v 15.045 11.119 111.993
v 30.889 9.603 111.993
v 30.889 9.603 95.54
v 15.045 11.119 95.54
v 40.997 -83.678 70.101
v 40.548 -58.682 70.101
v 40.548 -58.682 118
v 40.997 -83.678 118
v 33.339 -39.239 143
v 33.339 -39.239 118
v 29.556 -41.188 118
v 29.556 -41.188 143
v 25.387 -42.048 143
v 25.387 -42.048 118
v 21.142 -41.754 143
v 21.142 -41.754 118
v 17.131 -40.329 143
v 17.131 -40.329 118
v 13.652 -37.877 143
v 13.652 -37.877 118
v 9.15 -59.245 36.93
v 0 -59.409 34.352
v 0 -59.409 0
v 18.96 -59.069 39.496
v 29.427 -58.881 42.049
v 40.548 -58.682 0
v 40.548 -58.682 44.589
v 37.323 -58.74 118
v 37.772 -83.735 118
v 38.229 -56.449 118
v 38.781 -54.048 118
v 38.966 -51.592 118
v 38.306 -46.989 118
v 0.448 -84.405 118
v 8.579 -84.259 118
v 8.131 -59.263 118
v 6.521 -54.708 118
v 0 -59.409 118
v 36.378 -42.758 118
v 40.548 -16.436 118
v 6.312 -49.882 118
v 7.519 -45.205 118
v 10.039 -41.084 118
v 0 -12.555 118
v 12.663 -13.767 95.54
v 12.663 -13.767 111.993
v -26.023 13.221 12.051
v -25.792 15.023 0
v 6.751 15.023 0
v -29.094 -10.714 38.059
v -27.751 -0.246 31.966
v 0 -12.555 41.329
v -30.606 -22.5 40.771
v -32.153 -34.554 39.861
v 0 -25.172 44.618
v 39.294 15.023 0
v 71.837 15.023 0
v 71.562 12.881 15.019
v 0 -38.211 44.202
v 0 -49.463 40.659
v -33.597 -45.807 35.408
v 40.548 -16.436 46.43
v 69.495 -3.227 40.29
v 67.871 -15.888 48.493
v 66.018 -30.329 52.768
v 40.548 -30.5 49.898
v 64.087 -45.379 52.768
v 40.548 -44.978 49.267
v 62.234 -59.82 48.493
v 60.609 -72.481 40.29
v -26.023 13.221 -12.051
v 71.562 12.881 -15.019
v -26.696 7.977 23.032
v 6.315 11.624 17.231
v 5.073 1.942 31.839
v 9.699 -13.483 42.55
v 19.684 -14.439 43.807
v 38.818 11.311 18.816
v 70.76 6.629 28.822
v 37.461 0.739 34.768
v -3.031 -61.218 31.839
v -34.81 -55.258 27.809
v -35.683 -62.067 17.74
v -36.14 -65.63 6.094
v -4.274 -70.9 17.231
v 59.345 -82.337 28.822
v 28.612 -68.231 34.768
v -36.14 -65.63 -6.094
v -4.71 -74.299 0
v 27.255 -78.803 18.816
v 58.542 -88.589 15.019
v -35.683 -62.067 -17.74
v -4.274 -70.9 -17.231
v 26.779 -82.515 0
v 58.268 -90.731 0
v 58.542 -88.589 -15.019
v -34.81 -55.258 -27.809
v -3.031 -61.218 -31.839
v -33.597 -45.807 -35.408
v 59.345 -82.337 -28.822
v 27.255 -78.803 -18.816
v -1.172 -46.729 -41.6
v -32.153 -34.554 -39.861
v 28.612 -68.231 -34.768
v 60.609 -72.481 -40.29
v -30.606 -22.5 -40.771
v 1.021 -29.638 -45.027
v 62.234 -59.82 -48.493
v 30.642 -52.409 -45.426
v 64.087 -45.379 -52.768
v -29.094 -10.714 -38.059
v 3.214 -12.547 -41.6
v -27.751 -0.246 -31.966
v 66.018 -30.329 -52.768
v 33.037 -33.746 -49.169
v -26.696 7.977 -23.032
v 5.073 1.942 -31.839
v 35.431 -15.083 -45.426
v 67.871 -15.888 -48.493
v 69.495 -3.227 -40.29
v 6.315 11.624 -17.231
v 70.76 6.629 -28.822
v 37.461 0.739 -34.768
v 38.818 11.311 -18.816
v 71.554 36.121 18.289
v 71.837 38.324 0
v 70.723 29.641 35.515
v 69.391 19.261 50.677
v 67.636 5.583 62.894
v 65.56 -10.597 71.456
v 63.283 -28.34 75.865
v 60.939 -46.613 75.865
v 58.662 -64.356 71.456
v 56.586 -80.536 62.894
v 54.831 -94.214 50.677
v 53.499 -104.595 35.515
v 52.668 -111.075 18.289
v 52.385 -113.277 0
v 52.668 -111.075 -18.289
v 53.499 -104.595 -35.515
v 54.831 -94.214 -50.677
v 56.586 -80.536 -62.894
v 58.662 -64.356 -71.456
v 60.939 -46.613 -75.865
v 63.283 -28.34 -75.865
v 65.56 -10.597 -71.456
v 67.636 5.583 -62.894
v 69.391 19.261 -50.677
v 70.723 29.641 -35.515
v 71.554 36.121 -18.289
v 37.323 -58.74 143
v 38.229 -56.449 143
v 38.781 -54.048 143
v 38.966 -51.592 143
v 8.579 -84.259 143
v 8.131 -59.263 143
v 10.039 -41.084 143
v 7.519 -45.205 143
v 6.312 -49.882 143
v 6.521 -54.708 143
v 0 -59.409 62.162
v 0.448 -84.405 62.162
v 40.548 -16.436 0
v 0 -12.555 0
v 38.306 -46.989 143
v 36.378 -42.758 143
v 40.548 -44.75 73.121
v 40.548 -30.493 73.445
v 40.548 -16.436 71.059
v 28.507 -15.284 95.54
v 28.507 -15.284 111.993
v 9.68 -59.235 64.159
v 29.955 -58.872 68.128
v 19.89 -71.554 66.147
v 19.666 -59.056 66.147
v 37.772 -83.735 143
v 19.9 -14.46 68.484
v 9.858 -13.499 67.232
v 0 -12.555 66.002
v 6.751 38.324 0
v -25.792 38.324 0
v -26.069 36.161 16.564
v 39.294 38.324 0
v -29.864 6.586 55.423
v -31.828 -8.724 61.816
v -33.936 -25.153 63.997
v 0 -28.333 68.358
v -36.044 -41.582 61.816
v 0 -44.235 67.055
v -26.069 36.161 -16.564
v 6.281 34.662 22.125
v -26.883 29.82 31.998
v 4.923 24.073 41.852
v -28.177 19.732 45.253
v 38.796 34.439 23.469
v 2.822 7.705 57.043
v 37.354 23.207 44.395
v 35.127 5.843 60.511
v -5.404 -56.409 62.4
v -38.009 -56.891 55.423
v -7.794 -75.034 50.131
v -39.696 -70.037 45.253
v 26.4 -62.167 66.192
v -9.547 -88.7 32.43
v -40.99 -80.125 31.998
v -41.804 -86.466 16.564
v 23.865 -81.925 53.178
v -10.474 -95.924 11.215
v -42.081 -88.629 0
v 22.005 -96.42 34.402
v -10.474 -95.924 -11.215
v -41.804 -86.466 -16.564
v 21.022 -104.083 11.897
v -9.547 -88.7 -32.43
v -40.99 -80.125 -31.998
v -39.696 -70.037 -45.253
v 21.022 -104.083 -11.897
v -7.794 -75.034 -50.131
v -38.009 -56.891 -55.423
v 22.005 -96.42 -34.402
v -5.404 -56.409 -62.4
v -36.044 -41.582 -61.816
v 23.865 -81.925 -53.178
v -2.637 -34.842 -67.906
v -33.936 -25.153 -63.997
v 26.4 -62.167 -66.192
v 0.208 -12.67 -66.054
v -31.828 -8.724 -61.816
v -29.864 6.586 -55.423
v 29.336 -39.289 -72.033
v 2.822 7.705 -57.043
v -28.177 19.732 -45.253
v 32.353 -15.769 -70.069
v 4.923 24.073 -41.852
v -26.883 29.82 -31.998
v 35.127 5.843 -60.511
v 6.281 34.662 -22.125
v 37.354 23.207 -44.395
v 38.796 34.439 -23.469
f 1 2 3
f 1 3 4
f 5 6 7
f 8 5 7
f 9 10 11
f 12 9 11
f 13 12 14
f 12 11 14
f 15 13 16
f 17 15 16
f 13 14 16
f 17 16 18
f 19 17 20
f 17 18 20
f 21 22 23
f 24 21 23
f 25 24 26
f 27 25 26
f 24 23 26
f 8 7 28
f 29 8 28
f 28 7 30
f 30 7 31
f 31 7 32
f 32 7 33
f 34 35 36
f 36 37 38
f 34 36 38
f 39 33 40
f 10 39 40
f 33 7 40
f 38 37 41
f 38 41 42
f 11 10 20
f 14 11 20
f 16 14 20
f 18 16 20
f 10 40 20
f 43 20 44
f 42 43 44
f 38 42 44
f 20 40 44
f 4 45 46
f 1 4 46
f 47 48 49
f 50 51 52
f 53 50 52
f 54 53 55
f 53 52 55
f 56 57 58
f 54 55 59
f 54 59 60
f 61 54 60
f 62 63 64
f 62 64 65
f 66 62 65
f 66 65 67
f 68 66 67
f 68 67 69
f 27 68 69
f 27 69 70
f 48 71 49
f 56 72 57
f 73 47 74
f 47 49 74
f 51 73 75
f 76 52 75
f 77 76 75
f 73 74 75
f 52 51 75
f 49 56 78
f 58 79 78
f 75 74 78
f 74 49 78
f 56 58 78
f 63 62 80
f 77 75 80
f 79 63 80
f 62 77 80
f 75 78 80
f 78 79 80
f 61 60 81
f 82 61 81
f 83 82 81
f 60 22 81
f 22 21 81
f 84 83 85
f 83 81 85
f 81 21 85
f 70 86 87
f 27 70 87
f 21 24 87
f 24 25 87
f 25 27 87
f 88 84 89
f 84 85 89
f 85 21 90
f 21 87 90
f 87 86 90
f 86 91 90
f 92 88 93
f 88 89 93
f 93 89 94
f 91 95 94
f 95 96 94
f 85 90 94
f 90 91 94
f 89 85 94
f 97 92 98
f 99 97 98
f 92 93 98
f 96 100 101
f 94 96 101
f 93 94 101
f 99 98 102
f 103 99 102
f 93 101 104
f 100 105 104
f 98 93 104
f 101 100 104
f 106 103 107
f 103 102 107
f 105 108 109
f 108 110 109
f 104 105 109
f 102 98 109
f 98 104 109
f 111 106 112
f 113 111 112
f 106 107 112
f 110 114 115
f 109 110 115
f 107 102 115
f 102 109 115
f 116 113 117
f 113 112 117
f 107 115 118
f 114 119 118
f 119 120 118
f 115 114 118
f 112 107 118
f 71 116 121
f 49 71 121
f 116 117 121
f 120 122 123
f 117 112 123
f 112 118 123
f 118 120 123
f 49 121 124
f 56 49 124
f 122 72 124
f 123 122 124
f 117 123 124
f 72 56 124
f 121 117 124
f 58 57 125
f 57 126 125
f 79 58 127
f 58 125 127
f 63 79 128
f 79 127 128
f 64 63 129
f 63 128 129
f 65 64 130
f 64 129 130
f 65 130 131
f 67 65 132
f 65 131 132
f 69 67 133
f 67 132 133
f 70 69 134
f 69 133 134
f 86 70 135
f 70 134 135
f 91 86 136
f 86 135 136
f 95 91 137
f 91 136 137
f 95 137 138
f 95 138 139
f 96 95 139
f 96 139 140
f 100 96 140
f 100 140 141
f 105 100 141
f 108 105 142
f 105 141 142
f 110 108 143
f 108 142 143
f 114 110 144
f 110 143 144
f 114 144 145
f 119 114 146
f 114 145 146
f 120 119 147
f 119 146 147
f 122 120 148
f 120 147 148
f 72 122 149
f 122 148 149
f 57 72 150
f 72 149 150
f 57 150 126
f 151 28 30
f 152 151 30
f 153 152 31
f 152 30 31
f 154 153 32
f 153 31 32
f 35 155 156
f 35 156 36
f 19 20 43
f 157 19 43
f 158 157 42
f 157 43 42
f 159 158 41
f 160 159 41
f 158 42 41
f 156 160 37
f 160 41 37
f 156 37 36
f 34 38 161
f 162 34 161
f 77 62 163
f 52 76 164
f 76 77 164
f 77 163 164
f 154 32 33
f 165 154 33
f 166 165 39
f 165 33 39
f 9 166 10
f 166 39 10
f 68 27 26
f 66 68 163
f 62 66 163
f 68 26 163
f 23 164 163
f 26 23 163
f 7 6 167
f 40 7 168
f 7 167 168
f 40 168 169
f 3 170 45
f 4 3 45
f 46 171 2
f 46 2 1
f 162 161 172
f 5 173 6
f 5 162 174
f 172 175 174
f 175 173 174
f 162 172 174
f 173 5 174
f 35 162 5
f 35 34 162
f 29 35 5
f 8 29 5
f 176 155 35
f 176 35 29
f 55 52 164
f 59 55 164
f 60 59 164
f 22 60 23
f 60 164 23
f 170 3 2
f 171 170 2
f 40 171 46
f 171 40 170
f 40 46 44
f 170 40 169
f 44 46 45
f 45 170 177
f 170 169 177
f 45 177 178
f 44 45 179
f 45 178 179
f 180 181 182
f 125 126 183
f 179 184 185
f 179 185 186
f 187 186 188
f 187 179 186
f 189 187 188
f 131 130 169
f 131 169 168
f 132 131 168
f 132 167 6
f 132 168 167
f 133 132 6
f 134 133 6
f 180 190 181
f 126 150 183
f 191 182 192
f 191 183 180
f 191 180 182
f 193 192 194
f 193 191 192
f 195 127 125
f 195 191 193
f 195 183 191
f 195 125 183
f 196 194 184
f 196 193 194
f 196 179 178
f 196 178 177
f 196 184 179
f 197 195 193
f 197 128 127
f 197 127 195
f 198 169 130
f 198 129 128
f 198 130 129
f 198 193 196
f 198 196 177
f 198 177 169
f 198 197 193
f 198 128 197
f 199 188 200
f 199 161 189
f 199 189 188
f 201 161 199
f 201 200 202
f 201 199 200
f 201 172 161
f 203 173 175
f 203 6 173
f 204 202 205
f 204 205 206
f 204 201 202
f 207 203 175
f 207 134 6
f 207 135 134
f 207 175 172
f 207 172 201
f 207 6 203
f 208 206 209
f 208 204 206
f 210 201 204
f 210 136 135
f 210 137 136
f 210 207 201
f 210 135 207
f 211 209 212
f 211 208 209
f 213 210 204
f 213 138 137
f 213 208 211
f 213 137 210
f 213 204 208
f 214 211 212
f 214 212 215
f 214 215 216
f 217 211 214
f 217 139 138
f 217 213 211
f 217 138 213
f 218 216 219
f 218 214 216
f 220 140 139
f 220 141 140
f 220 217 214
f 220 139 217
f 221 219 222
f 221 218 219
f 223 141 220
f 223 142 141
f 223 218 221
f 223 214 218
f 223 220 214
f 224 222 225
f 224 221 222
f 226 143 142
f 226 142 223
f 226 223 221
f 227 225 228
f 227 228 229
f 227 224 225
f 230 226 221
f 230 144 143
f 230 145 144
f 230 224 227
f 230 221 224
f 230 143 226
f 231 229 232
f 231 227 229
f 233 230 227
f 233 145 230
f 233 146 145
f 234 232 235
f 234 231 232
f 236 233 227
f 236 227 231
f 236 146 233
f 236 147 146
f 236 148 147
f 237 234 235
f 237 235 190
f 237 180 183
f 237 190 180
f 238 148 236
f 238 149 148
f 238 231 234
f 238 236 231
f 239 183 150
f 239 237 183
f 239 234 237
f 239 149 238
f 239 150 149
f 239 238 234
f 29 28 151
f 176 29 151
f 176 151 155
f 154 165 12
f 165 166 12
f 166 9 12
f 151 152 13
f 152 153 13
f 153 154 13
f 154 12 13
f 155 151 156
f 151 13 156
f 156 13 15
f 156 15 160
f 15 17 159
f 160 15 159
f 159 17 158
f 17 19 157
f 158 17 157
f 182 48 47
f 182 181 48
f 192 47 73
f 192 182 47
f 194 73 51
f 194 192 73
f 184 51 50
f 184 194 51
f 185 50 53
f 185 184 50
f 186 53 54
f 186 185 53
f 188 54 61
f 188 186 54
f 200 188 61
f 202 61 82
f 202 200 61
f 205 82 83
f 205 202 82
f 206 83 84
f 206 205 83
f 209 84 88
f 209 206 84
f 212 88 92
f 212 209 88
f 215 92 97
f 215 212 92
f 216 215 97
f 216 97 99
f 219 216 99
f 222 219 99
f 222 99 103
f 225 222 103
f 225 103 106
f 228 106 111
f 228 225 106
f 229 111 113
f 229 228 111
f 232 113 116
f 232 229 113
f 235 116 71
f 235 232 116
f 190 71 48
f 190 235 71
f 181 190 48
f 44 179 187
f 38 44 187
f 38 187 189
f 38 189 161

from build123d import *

# Parameters (mm, degrees)
F0_W      = 97.628775984
F0_H      = 23.3006943017
F3_DEPTH  = 118
F5_DEPTH  = 25
F6_W      = 12.4683696777
F6_H      = 23.7819701433
F7_DEPTH  = 25
F6_W_2    = 16.8170528486
F6_H_2    = 20.5661654472
F6_W_3    = 3.8202507421
F6_H_3    = 18.9904868603
F5_FACE_W = 12.4683696777
F5_FACE_H = 23.7819701433
F8_DEPTH  = 25
F9_W      = 15.9168411046
F9_H      = 16.453512013
F10_DEPTH = 25


with BuildPart() as f1:
    # F0 (on Top) → F1 (revolve)
    with BuildSketch(Plane.XY):
        with Locations((23.0226498097, 26.6735097393)):
            Rectangle(F0_W, F0_H)
    revolve(axis=Axis((24.7196350247, -32.6789328828, 0), (0.9918684705, -0.1272671882, 0)))

    # F2 (on Top) → F3 (join)
    with BuildSketch(Plane.XY):
        Polygon((0, -12.5550432131), (0, -59.4090670347), (40.5481569469, -58.6816631258), (40.5481569469, -16.4360441267), align=None)
    extrude(amount=F3_DEPTH)

    # F4 (on face) → F5 (join)
    with BuildSketch(Plane.XY.offset(118)):
        with BuildLine():
            ThreePointArc((38.9660080346, -51.5918619931), (37.4929859335, -44.804908652), (33.3389817945, -39.2392299533))
            ThreePointArc((33.3389817945, -39.2392299533), (23.254398026, -42.045514844), (13.6522556306, -37.8774306208))
            ThreePointArc((13.6522556306, -37.8774306208), (6.7419373602, -47.498950756), (8.1305858475, -59.2632103455))
            Line((8.1305858475, -59.2632103455), (37.3233440131, -58.7395138818))
            ThreePointArc((37.3233440131, -58.7395138818), (38.5500581705, -55.2588523329), (38.9660080346, -51.5918619931))
        make_face()
    extrude(amount=F5_DEPTH)

    # F6 (on face) → F7 (join)
    with BuildSketch(Plane(origin=(1.0654118014, -59.389954336, 0), x_dir=(0.9998391303, 0.0179363736, 0), z_dir=(0.0179363736, -0.9998391303, 0))):
        with Locations((26.5645338222, 119.3591877818)):
            Rectangle(F6_W, F6_H)
    extrude(amount=F7_DEPTH)

    # F6 (on face) + F5_face (on face) → F8 (join)
    with BuildSketch(Plane(origin=(1.0654118014, -59.389954336, 0), x_dir=(0.9998391303, 0.0179363736, 0), z_dir=(0.0179363736, -0.9998391303, 0))):
        with Locations((18.3676513843, 90.3412923217)):
            Rectangle(F6_W_2, F6_H_2)
        with Locations((26.5645338222, 119.3591877818)):
            Rectangle(F6_W, F6_H)
        with Locations((12.6832216047, 116.9634461403)):
            Rectangle(F6_W_3, F6_H_3)
    with BuildSketch(Plane(origin=(20.5226573435, -59.0409057594, 101.9755675833), x_dir=(0.9998391303, 0.0179363736, 0), z_dir=(0.0179363736, -0.9998391303, 0))):
        with BuildLine():
            add(Edge.make_bspline(
                [(-20.5259593482, -39.813077169), (-1.4657323401, -35.8130367899), (20.0287216176, -31.8741575877)],
                knots=[3.4641055883, 3.4641055883, 3.4641055883, 3.5071067631, 3.5071067631, 3.5071067631], degree=2, weights=[1, 0.9997688713, 1]))
            Line((20.0287216176, -31.8741575877), (20.0287216176, 16.0244324167))
            Line((20.0287216176, 16.0244324167), (16.8033898257, 16.0244324167))
            Line((16.8033898257, 16.0244324167), (16.8033898257, 41.0244324167))
            Line((16.8033898257, 41.0244324167), (-12.3940653254, 41.0244324167))
            Line((-12.3940653254, 41.0244324167), (-12.3940653254, 16.0244324167))
            Line((-12.3940653254, 16.0244324167), (-20.5259593482, 16.0244324167))
            Line((-20.5259593482, 16.0244324167), (-20.5259593482, -39.813077169))
        make_face()
        with Locations((7.1041576955, 17.3836201985)):
            Rectangle(F5_FACE_W, F5_FACE_H, mode=Mode.SUBTRACT)
    extrude(amount=F8_DEPTH)

    # F9 (on face) → F10 (join)
    with BuildSketch(Plane(origin=(-1.1907767819, -12.4410699495, 0), x_dir=(-0.9954507085, 0.095277946, 0), z_dir=(0.095277946, 0.9954507085, 0))):
        with Locations((-21.8754792586, 103.7665121257)):
            Rectangle(F9_W, F9_H)
    extrude(amount=F10_DEPTH)


solid = f1.part
